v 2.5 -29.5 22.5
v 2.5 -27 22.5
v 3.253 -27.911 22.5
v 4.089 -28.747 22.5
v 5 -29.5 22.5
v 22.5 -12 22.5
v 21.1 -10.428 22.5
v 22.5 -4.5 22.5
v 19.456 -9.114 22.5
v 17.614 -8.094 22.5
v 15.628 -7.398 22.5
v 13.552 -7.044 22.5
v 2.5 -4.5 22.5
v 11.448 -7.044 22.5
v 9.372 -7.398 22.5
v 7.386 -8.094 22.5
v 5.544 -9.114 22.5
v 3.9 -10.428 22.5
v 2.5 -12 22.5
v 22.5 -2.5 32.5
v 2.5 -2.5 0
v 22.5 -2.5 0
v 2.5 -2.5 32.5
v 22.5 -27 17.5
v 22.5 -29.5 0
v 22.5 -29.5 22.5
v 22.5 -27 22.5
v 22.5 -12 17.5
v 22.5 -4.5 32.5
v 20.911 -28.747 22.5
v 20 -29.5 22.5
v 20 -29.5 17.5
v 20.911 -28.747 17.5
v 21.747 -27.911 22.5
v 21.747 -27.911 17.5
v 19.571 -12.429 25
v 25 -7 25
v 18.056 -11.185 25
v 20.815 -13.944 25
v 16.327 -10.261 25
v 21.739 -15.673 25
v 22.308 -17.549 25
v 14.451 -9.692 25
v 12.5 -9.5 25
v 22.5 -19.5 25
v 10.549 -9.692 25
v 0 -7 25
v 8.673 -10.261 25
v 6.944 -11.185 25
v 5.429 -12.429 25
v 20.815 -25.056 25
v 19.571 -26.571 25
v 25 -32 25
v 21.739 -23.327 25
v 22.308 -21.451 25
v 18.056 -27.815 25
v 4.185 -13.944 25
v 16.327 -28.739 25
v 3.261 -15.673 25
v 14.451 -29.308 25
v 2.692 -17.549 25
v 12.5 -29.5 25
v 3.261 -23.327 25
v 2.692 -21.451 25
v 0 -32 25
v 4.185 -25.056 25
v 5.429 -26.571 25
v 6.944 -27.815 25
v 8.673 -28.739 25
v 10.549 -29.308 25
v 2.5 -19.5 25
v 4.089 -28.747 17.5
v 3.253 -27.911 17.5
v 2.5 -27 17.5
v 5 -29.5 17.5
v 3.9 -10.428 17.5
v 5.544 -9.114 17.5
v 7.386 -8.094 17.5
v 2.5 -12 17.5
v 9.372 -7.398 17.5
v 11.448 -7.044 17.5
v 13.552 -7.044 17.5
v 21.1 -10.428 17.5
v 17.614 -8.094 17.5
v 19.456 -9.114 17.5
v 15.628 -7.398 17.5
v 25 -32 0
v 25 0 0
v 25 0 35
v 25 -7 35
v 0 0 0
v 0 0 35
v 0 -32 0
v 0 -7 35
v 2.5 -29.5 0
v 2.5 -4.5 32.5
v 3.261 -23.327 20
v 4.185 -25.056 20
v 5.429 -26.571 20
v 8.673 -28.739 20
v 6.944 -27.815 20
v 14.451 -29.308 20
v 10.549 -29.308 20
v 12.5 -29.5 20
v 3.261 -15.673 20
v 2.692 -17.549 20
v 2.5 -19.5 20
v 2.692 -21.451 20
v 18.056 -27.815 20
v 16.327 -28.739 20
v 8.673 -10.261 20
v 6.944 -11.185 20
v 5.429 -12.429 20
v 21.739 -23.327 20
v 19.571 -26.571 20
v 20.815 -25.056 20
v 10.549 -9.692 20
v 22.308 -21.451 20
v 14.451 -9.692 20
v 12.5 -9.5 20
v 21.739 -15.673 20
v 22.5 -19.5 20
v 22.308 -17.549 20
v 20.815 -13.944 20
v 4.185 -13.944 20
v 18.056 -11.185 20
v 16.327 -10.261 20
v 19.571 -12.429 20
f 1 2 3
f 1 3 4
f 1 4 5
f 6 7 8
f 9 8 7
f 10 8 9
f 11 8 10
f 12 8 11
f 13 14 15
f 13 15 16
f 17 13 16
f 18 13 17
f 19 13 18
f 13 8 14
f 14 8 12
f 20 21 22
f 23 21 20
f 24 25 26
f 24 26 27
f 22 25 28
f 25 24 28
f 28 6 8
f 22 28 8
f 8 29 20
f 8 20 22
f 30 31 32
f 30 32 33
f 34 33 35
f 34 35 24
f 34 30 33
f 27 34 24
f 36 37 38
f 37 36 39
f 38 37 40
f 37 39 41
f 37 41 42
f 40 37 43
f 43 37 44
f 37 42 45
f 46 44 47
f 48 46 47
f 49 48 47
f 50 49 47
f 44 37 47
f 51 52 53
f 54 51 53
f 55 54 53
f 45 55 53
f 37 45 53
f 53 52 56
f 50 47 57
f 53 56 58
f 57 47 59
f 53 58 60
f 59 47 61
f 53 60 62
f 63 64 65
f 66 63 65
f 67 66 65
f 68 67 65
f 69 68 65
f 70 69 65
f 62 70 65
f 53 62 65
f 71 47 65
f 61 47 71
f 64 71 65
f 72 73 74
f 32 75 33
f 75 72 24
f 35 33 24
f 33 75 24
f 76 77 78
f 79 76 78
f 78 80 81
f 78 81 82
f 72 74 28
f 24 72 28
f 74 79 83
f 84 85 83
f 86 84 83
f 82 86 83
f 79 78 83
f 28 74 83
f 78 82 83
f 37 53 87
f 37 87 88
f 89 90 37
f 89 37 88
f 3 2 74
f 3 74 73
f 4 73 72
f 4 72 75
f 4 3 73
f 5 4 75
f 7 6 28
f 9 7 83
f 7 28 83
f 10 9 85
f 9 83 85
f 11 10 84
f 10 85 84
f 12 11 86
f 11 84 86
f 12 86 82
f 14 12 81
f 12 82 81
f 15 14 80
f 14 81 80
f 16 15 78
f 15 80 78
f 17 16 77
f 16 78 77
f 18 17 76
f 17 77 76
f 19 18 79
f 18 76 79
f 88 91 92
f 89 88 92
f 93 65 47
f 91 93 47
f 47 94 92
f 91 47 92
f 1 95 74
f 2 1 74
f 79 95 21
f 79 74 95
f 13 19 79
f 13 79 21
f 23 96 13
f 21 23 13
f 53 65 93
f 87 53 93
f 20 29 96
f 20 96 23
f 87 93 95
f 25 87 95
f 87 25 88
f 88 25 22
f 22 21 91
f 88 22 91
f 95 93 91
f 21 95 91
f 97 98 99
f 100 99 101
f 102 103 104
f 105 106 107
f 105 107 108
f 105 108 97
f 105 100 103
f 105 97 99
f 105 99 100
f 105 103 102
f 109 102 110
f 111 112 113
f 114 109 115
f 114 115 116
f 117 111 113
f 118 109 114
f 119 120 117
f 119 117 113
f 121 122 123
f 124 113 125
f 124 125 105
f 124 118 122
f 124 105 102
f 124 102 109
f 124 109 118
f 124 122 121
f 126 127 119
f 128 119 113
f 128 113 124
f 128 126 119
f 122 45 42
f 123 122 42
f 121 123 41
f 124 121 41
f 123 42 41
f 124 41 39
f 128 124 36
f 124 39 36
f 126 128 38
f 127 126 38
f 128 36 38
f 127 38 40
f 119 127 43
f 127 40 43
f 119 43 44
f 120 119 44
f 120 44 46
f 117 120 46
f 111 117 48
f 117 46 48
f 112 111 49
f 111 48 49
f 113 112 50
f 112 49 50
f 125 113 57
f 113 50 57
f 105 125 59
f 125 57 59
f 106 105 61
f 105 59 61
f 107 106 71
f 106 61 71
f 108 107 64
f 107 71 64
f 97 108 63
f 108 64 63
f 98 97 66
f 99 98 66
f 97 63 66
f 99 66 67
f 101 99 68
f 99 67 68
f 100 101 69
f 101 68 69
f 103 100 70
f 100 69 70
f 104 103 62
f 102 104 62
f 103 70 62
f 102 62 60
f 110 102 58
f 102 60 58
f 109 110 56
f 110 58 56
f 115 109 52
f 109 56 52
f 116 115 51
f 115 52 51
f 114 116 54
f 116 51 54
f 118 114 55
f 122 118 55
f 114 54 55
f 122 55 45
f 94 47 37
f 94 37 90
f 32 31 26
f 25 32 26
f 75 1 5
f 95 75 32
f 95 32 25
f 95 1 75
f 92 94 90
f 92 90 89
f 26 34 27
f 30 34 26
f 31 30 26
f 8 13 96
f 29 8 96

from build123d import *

# Parameters (mm, degrees)
F0_W        = 7
F0_H        = 10
F1_DEPTH    = 25
F2_R        = 10
F3_DEPTH    = 5
F4_T        = 2.5
F4_T3_DEPTH = 30


# Not quite as in the source:
# - a shell that OpenCascade refuses in one call is made with other operations: the cavity is built on its own and cut out


with BuildPart() as f1:
    # F0 (on Right) → F1 (new body)
    with BuildSketch(Plane.YZ):
        with Locations((-3.5, 30)):
            Rectangle(F0_W, F0_H)
        Polygon((-32, 0), (0, 0), (0, 25), (-7, 25), (-32, 25), align=None)
    extrude(amount=F1_DEPTH)

    # F2 (on face) → F3 (cut)
    with BuildSketch(Plane.XY.offset(25)):
        with Locations((12.5, -19.5)):
            Circle(F2_R)
    extrude(amount=-F3_DEPTH, mode=Mode.SUBTRACT)

    # F4: shell of thickness 2.5, made by hand


with BuildPart() as f4_core1:
    # F4_t2: copy of F1
    add(f1.part)

    # the walls: a layer under each face that stays
    f4_faces = [f4_core1.faces().sort_by_distance(p)[0] for p in [
        (12.5, -3.5, 35),
        (12.5, 0, 17.5),
        (12.5, -7, 30),
        (0, -16, 17.5),
        (25, -16, 17.5),
        (20.8333333333, -11.1666666667, 25),
        (12.5, -32, 12.5),
        (2.5, -19.5, 22.5),
        (12.5, -19.5, 20),
    ]]
    thicken(f4_faces, amount=-F4_T, mode=Mode.SUBTRACT)

    # F4_s4 → F4_t3 (cut)
    with BuildSketch(Plane.YZ.offset(-2.5)):
        Polygon((-7.025, 25.025), (-4.5, 25), (-4.5, 22.5), (-7, 22.5), align=None)
    extrude(amount=F4_T3_DEPTH, mode=Mode.SUBTRACT)

    # F4_s5 → F4_t6 (revolve, cut)
    with BuildSketch(Plane.XZ.offset(19.5)):
        Polygon((22.475, 20.025), (25, 20), (25, 17.5), (22.5, 17.5), align=None)
    revolve(axis=Axis((12.5, -19.5, 20), (0, 0, 1)), mode=Mode.SUBTRACT)


with BuildPart() as f1_1:
    add(f1.part)

    # what is left inside the walls is the cavity
    f4_cavity = [f4_core1.part.solids().sort_by_distance(p)[0] for p in [
        (15.833333, -2.525, 16.25),
    ]]
    add(f4_cavity, mode=Mode.SUBTRACT)


solid = f1_1.part
